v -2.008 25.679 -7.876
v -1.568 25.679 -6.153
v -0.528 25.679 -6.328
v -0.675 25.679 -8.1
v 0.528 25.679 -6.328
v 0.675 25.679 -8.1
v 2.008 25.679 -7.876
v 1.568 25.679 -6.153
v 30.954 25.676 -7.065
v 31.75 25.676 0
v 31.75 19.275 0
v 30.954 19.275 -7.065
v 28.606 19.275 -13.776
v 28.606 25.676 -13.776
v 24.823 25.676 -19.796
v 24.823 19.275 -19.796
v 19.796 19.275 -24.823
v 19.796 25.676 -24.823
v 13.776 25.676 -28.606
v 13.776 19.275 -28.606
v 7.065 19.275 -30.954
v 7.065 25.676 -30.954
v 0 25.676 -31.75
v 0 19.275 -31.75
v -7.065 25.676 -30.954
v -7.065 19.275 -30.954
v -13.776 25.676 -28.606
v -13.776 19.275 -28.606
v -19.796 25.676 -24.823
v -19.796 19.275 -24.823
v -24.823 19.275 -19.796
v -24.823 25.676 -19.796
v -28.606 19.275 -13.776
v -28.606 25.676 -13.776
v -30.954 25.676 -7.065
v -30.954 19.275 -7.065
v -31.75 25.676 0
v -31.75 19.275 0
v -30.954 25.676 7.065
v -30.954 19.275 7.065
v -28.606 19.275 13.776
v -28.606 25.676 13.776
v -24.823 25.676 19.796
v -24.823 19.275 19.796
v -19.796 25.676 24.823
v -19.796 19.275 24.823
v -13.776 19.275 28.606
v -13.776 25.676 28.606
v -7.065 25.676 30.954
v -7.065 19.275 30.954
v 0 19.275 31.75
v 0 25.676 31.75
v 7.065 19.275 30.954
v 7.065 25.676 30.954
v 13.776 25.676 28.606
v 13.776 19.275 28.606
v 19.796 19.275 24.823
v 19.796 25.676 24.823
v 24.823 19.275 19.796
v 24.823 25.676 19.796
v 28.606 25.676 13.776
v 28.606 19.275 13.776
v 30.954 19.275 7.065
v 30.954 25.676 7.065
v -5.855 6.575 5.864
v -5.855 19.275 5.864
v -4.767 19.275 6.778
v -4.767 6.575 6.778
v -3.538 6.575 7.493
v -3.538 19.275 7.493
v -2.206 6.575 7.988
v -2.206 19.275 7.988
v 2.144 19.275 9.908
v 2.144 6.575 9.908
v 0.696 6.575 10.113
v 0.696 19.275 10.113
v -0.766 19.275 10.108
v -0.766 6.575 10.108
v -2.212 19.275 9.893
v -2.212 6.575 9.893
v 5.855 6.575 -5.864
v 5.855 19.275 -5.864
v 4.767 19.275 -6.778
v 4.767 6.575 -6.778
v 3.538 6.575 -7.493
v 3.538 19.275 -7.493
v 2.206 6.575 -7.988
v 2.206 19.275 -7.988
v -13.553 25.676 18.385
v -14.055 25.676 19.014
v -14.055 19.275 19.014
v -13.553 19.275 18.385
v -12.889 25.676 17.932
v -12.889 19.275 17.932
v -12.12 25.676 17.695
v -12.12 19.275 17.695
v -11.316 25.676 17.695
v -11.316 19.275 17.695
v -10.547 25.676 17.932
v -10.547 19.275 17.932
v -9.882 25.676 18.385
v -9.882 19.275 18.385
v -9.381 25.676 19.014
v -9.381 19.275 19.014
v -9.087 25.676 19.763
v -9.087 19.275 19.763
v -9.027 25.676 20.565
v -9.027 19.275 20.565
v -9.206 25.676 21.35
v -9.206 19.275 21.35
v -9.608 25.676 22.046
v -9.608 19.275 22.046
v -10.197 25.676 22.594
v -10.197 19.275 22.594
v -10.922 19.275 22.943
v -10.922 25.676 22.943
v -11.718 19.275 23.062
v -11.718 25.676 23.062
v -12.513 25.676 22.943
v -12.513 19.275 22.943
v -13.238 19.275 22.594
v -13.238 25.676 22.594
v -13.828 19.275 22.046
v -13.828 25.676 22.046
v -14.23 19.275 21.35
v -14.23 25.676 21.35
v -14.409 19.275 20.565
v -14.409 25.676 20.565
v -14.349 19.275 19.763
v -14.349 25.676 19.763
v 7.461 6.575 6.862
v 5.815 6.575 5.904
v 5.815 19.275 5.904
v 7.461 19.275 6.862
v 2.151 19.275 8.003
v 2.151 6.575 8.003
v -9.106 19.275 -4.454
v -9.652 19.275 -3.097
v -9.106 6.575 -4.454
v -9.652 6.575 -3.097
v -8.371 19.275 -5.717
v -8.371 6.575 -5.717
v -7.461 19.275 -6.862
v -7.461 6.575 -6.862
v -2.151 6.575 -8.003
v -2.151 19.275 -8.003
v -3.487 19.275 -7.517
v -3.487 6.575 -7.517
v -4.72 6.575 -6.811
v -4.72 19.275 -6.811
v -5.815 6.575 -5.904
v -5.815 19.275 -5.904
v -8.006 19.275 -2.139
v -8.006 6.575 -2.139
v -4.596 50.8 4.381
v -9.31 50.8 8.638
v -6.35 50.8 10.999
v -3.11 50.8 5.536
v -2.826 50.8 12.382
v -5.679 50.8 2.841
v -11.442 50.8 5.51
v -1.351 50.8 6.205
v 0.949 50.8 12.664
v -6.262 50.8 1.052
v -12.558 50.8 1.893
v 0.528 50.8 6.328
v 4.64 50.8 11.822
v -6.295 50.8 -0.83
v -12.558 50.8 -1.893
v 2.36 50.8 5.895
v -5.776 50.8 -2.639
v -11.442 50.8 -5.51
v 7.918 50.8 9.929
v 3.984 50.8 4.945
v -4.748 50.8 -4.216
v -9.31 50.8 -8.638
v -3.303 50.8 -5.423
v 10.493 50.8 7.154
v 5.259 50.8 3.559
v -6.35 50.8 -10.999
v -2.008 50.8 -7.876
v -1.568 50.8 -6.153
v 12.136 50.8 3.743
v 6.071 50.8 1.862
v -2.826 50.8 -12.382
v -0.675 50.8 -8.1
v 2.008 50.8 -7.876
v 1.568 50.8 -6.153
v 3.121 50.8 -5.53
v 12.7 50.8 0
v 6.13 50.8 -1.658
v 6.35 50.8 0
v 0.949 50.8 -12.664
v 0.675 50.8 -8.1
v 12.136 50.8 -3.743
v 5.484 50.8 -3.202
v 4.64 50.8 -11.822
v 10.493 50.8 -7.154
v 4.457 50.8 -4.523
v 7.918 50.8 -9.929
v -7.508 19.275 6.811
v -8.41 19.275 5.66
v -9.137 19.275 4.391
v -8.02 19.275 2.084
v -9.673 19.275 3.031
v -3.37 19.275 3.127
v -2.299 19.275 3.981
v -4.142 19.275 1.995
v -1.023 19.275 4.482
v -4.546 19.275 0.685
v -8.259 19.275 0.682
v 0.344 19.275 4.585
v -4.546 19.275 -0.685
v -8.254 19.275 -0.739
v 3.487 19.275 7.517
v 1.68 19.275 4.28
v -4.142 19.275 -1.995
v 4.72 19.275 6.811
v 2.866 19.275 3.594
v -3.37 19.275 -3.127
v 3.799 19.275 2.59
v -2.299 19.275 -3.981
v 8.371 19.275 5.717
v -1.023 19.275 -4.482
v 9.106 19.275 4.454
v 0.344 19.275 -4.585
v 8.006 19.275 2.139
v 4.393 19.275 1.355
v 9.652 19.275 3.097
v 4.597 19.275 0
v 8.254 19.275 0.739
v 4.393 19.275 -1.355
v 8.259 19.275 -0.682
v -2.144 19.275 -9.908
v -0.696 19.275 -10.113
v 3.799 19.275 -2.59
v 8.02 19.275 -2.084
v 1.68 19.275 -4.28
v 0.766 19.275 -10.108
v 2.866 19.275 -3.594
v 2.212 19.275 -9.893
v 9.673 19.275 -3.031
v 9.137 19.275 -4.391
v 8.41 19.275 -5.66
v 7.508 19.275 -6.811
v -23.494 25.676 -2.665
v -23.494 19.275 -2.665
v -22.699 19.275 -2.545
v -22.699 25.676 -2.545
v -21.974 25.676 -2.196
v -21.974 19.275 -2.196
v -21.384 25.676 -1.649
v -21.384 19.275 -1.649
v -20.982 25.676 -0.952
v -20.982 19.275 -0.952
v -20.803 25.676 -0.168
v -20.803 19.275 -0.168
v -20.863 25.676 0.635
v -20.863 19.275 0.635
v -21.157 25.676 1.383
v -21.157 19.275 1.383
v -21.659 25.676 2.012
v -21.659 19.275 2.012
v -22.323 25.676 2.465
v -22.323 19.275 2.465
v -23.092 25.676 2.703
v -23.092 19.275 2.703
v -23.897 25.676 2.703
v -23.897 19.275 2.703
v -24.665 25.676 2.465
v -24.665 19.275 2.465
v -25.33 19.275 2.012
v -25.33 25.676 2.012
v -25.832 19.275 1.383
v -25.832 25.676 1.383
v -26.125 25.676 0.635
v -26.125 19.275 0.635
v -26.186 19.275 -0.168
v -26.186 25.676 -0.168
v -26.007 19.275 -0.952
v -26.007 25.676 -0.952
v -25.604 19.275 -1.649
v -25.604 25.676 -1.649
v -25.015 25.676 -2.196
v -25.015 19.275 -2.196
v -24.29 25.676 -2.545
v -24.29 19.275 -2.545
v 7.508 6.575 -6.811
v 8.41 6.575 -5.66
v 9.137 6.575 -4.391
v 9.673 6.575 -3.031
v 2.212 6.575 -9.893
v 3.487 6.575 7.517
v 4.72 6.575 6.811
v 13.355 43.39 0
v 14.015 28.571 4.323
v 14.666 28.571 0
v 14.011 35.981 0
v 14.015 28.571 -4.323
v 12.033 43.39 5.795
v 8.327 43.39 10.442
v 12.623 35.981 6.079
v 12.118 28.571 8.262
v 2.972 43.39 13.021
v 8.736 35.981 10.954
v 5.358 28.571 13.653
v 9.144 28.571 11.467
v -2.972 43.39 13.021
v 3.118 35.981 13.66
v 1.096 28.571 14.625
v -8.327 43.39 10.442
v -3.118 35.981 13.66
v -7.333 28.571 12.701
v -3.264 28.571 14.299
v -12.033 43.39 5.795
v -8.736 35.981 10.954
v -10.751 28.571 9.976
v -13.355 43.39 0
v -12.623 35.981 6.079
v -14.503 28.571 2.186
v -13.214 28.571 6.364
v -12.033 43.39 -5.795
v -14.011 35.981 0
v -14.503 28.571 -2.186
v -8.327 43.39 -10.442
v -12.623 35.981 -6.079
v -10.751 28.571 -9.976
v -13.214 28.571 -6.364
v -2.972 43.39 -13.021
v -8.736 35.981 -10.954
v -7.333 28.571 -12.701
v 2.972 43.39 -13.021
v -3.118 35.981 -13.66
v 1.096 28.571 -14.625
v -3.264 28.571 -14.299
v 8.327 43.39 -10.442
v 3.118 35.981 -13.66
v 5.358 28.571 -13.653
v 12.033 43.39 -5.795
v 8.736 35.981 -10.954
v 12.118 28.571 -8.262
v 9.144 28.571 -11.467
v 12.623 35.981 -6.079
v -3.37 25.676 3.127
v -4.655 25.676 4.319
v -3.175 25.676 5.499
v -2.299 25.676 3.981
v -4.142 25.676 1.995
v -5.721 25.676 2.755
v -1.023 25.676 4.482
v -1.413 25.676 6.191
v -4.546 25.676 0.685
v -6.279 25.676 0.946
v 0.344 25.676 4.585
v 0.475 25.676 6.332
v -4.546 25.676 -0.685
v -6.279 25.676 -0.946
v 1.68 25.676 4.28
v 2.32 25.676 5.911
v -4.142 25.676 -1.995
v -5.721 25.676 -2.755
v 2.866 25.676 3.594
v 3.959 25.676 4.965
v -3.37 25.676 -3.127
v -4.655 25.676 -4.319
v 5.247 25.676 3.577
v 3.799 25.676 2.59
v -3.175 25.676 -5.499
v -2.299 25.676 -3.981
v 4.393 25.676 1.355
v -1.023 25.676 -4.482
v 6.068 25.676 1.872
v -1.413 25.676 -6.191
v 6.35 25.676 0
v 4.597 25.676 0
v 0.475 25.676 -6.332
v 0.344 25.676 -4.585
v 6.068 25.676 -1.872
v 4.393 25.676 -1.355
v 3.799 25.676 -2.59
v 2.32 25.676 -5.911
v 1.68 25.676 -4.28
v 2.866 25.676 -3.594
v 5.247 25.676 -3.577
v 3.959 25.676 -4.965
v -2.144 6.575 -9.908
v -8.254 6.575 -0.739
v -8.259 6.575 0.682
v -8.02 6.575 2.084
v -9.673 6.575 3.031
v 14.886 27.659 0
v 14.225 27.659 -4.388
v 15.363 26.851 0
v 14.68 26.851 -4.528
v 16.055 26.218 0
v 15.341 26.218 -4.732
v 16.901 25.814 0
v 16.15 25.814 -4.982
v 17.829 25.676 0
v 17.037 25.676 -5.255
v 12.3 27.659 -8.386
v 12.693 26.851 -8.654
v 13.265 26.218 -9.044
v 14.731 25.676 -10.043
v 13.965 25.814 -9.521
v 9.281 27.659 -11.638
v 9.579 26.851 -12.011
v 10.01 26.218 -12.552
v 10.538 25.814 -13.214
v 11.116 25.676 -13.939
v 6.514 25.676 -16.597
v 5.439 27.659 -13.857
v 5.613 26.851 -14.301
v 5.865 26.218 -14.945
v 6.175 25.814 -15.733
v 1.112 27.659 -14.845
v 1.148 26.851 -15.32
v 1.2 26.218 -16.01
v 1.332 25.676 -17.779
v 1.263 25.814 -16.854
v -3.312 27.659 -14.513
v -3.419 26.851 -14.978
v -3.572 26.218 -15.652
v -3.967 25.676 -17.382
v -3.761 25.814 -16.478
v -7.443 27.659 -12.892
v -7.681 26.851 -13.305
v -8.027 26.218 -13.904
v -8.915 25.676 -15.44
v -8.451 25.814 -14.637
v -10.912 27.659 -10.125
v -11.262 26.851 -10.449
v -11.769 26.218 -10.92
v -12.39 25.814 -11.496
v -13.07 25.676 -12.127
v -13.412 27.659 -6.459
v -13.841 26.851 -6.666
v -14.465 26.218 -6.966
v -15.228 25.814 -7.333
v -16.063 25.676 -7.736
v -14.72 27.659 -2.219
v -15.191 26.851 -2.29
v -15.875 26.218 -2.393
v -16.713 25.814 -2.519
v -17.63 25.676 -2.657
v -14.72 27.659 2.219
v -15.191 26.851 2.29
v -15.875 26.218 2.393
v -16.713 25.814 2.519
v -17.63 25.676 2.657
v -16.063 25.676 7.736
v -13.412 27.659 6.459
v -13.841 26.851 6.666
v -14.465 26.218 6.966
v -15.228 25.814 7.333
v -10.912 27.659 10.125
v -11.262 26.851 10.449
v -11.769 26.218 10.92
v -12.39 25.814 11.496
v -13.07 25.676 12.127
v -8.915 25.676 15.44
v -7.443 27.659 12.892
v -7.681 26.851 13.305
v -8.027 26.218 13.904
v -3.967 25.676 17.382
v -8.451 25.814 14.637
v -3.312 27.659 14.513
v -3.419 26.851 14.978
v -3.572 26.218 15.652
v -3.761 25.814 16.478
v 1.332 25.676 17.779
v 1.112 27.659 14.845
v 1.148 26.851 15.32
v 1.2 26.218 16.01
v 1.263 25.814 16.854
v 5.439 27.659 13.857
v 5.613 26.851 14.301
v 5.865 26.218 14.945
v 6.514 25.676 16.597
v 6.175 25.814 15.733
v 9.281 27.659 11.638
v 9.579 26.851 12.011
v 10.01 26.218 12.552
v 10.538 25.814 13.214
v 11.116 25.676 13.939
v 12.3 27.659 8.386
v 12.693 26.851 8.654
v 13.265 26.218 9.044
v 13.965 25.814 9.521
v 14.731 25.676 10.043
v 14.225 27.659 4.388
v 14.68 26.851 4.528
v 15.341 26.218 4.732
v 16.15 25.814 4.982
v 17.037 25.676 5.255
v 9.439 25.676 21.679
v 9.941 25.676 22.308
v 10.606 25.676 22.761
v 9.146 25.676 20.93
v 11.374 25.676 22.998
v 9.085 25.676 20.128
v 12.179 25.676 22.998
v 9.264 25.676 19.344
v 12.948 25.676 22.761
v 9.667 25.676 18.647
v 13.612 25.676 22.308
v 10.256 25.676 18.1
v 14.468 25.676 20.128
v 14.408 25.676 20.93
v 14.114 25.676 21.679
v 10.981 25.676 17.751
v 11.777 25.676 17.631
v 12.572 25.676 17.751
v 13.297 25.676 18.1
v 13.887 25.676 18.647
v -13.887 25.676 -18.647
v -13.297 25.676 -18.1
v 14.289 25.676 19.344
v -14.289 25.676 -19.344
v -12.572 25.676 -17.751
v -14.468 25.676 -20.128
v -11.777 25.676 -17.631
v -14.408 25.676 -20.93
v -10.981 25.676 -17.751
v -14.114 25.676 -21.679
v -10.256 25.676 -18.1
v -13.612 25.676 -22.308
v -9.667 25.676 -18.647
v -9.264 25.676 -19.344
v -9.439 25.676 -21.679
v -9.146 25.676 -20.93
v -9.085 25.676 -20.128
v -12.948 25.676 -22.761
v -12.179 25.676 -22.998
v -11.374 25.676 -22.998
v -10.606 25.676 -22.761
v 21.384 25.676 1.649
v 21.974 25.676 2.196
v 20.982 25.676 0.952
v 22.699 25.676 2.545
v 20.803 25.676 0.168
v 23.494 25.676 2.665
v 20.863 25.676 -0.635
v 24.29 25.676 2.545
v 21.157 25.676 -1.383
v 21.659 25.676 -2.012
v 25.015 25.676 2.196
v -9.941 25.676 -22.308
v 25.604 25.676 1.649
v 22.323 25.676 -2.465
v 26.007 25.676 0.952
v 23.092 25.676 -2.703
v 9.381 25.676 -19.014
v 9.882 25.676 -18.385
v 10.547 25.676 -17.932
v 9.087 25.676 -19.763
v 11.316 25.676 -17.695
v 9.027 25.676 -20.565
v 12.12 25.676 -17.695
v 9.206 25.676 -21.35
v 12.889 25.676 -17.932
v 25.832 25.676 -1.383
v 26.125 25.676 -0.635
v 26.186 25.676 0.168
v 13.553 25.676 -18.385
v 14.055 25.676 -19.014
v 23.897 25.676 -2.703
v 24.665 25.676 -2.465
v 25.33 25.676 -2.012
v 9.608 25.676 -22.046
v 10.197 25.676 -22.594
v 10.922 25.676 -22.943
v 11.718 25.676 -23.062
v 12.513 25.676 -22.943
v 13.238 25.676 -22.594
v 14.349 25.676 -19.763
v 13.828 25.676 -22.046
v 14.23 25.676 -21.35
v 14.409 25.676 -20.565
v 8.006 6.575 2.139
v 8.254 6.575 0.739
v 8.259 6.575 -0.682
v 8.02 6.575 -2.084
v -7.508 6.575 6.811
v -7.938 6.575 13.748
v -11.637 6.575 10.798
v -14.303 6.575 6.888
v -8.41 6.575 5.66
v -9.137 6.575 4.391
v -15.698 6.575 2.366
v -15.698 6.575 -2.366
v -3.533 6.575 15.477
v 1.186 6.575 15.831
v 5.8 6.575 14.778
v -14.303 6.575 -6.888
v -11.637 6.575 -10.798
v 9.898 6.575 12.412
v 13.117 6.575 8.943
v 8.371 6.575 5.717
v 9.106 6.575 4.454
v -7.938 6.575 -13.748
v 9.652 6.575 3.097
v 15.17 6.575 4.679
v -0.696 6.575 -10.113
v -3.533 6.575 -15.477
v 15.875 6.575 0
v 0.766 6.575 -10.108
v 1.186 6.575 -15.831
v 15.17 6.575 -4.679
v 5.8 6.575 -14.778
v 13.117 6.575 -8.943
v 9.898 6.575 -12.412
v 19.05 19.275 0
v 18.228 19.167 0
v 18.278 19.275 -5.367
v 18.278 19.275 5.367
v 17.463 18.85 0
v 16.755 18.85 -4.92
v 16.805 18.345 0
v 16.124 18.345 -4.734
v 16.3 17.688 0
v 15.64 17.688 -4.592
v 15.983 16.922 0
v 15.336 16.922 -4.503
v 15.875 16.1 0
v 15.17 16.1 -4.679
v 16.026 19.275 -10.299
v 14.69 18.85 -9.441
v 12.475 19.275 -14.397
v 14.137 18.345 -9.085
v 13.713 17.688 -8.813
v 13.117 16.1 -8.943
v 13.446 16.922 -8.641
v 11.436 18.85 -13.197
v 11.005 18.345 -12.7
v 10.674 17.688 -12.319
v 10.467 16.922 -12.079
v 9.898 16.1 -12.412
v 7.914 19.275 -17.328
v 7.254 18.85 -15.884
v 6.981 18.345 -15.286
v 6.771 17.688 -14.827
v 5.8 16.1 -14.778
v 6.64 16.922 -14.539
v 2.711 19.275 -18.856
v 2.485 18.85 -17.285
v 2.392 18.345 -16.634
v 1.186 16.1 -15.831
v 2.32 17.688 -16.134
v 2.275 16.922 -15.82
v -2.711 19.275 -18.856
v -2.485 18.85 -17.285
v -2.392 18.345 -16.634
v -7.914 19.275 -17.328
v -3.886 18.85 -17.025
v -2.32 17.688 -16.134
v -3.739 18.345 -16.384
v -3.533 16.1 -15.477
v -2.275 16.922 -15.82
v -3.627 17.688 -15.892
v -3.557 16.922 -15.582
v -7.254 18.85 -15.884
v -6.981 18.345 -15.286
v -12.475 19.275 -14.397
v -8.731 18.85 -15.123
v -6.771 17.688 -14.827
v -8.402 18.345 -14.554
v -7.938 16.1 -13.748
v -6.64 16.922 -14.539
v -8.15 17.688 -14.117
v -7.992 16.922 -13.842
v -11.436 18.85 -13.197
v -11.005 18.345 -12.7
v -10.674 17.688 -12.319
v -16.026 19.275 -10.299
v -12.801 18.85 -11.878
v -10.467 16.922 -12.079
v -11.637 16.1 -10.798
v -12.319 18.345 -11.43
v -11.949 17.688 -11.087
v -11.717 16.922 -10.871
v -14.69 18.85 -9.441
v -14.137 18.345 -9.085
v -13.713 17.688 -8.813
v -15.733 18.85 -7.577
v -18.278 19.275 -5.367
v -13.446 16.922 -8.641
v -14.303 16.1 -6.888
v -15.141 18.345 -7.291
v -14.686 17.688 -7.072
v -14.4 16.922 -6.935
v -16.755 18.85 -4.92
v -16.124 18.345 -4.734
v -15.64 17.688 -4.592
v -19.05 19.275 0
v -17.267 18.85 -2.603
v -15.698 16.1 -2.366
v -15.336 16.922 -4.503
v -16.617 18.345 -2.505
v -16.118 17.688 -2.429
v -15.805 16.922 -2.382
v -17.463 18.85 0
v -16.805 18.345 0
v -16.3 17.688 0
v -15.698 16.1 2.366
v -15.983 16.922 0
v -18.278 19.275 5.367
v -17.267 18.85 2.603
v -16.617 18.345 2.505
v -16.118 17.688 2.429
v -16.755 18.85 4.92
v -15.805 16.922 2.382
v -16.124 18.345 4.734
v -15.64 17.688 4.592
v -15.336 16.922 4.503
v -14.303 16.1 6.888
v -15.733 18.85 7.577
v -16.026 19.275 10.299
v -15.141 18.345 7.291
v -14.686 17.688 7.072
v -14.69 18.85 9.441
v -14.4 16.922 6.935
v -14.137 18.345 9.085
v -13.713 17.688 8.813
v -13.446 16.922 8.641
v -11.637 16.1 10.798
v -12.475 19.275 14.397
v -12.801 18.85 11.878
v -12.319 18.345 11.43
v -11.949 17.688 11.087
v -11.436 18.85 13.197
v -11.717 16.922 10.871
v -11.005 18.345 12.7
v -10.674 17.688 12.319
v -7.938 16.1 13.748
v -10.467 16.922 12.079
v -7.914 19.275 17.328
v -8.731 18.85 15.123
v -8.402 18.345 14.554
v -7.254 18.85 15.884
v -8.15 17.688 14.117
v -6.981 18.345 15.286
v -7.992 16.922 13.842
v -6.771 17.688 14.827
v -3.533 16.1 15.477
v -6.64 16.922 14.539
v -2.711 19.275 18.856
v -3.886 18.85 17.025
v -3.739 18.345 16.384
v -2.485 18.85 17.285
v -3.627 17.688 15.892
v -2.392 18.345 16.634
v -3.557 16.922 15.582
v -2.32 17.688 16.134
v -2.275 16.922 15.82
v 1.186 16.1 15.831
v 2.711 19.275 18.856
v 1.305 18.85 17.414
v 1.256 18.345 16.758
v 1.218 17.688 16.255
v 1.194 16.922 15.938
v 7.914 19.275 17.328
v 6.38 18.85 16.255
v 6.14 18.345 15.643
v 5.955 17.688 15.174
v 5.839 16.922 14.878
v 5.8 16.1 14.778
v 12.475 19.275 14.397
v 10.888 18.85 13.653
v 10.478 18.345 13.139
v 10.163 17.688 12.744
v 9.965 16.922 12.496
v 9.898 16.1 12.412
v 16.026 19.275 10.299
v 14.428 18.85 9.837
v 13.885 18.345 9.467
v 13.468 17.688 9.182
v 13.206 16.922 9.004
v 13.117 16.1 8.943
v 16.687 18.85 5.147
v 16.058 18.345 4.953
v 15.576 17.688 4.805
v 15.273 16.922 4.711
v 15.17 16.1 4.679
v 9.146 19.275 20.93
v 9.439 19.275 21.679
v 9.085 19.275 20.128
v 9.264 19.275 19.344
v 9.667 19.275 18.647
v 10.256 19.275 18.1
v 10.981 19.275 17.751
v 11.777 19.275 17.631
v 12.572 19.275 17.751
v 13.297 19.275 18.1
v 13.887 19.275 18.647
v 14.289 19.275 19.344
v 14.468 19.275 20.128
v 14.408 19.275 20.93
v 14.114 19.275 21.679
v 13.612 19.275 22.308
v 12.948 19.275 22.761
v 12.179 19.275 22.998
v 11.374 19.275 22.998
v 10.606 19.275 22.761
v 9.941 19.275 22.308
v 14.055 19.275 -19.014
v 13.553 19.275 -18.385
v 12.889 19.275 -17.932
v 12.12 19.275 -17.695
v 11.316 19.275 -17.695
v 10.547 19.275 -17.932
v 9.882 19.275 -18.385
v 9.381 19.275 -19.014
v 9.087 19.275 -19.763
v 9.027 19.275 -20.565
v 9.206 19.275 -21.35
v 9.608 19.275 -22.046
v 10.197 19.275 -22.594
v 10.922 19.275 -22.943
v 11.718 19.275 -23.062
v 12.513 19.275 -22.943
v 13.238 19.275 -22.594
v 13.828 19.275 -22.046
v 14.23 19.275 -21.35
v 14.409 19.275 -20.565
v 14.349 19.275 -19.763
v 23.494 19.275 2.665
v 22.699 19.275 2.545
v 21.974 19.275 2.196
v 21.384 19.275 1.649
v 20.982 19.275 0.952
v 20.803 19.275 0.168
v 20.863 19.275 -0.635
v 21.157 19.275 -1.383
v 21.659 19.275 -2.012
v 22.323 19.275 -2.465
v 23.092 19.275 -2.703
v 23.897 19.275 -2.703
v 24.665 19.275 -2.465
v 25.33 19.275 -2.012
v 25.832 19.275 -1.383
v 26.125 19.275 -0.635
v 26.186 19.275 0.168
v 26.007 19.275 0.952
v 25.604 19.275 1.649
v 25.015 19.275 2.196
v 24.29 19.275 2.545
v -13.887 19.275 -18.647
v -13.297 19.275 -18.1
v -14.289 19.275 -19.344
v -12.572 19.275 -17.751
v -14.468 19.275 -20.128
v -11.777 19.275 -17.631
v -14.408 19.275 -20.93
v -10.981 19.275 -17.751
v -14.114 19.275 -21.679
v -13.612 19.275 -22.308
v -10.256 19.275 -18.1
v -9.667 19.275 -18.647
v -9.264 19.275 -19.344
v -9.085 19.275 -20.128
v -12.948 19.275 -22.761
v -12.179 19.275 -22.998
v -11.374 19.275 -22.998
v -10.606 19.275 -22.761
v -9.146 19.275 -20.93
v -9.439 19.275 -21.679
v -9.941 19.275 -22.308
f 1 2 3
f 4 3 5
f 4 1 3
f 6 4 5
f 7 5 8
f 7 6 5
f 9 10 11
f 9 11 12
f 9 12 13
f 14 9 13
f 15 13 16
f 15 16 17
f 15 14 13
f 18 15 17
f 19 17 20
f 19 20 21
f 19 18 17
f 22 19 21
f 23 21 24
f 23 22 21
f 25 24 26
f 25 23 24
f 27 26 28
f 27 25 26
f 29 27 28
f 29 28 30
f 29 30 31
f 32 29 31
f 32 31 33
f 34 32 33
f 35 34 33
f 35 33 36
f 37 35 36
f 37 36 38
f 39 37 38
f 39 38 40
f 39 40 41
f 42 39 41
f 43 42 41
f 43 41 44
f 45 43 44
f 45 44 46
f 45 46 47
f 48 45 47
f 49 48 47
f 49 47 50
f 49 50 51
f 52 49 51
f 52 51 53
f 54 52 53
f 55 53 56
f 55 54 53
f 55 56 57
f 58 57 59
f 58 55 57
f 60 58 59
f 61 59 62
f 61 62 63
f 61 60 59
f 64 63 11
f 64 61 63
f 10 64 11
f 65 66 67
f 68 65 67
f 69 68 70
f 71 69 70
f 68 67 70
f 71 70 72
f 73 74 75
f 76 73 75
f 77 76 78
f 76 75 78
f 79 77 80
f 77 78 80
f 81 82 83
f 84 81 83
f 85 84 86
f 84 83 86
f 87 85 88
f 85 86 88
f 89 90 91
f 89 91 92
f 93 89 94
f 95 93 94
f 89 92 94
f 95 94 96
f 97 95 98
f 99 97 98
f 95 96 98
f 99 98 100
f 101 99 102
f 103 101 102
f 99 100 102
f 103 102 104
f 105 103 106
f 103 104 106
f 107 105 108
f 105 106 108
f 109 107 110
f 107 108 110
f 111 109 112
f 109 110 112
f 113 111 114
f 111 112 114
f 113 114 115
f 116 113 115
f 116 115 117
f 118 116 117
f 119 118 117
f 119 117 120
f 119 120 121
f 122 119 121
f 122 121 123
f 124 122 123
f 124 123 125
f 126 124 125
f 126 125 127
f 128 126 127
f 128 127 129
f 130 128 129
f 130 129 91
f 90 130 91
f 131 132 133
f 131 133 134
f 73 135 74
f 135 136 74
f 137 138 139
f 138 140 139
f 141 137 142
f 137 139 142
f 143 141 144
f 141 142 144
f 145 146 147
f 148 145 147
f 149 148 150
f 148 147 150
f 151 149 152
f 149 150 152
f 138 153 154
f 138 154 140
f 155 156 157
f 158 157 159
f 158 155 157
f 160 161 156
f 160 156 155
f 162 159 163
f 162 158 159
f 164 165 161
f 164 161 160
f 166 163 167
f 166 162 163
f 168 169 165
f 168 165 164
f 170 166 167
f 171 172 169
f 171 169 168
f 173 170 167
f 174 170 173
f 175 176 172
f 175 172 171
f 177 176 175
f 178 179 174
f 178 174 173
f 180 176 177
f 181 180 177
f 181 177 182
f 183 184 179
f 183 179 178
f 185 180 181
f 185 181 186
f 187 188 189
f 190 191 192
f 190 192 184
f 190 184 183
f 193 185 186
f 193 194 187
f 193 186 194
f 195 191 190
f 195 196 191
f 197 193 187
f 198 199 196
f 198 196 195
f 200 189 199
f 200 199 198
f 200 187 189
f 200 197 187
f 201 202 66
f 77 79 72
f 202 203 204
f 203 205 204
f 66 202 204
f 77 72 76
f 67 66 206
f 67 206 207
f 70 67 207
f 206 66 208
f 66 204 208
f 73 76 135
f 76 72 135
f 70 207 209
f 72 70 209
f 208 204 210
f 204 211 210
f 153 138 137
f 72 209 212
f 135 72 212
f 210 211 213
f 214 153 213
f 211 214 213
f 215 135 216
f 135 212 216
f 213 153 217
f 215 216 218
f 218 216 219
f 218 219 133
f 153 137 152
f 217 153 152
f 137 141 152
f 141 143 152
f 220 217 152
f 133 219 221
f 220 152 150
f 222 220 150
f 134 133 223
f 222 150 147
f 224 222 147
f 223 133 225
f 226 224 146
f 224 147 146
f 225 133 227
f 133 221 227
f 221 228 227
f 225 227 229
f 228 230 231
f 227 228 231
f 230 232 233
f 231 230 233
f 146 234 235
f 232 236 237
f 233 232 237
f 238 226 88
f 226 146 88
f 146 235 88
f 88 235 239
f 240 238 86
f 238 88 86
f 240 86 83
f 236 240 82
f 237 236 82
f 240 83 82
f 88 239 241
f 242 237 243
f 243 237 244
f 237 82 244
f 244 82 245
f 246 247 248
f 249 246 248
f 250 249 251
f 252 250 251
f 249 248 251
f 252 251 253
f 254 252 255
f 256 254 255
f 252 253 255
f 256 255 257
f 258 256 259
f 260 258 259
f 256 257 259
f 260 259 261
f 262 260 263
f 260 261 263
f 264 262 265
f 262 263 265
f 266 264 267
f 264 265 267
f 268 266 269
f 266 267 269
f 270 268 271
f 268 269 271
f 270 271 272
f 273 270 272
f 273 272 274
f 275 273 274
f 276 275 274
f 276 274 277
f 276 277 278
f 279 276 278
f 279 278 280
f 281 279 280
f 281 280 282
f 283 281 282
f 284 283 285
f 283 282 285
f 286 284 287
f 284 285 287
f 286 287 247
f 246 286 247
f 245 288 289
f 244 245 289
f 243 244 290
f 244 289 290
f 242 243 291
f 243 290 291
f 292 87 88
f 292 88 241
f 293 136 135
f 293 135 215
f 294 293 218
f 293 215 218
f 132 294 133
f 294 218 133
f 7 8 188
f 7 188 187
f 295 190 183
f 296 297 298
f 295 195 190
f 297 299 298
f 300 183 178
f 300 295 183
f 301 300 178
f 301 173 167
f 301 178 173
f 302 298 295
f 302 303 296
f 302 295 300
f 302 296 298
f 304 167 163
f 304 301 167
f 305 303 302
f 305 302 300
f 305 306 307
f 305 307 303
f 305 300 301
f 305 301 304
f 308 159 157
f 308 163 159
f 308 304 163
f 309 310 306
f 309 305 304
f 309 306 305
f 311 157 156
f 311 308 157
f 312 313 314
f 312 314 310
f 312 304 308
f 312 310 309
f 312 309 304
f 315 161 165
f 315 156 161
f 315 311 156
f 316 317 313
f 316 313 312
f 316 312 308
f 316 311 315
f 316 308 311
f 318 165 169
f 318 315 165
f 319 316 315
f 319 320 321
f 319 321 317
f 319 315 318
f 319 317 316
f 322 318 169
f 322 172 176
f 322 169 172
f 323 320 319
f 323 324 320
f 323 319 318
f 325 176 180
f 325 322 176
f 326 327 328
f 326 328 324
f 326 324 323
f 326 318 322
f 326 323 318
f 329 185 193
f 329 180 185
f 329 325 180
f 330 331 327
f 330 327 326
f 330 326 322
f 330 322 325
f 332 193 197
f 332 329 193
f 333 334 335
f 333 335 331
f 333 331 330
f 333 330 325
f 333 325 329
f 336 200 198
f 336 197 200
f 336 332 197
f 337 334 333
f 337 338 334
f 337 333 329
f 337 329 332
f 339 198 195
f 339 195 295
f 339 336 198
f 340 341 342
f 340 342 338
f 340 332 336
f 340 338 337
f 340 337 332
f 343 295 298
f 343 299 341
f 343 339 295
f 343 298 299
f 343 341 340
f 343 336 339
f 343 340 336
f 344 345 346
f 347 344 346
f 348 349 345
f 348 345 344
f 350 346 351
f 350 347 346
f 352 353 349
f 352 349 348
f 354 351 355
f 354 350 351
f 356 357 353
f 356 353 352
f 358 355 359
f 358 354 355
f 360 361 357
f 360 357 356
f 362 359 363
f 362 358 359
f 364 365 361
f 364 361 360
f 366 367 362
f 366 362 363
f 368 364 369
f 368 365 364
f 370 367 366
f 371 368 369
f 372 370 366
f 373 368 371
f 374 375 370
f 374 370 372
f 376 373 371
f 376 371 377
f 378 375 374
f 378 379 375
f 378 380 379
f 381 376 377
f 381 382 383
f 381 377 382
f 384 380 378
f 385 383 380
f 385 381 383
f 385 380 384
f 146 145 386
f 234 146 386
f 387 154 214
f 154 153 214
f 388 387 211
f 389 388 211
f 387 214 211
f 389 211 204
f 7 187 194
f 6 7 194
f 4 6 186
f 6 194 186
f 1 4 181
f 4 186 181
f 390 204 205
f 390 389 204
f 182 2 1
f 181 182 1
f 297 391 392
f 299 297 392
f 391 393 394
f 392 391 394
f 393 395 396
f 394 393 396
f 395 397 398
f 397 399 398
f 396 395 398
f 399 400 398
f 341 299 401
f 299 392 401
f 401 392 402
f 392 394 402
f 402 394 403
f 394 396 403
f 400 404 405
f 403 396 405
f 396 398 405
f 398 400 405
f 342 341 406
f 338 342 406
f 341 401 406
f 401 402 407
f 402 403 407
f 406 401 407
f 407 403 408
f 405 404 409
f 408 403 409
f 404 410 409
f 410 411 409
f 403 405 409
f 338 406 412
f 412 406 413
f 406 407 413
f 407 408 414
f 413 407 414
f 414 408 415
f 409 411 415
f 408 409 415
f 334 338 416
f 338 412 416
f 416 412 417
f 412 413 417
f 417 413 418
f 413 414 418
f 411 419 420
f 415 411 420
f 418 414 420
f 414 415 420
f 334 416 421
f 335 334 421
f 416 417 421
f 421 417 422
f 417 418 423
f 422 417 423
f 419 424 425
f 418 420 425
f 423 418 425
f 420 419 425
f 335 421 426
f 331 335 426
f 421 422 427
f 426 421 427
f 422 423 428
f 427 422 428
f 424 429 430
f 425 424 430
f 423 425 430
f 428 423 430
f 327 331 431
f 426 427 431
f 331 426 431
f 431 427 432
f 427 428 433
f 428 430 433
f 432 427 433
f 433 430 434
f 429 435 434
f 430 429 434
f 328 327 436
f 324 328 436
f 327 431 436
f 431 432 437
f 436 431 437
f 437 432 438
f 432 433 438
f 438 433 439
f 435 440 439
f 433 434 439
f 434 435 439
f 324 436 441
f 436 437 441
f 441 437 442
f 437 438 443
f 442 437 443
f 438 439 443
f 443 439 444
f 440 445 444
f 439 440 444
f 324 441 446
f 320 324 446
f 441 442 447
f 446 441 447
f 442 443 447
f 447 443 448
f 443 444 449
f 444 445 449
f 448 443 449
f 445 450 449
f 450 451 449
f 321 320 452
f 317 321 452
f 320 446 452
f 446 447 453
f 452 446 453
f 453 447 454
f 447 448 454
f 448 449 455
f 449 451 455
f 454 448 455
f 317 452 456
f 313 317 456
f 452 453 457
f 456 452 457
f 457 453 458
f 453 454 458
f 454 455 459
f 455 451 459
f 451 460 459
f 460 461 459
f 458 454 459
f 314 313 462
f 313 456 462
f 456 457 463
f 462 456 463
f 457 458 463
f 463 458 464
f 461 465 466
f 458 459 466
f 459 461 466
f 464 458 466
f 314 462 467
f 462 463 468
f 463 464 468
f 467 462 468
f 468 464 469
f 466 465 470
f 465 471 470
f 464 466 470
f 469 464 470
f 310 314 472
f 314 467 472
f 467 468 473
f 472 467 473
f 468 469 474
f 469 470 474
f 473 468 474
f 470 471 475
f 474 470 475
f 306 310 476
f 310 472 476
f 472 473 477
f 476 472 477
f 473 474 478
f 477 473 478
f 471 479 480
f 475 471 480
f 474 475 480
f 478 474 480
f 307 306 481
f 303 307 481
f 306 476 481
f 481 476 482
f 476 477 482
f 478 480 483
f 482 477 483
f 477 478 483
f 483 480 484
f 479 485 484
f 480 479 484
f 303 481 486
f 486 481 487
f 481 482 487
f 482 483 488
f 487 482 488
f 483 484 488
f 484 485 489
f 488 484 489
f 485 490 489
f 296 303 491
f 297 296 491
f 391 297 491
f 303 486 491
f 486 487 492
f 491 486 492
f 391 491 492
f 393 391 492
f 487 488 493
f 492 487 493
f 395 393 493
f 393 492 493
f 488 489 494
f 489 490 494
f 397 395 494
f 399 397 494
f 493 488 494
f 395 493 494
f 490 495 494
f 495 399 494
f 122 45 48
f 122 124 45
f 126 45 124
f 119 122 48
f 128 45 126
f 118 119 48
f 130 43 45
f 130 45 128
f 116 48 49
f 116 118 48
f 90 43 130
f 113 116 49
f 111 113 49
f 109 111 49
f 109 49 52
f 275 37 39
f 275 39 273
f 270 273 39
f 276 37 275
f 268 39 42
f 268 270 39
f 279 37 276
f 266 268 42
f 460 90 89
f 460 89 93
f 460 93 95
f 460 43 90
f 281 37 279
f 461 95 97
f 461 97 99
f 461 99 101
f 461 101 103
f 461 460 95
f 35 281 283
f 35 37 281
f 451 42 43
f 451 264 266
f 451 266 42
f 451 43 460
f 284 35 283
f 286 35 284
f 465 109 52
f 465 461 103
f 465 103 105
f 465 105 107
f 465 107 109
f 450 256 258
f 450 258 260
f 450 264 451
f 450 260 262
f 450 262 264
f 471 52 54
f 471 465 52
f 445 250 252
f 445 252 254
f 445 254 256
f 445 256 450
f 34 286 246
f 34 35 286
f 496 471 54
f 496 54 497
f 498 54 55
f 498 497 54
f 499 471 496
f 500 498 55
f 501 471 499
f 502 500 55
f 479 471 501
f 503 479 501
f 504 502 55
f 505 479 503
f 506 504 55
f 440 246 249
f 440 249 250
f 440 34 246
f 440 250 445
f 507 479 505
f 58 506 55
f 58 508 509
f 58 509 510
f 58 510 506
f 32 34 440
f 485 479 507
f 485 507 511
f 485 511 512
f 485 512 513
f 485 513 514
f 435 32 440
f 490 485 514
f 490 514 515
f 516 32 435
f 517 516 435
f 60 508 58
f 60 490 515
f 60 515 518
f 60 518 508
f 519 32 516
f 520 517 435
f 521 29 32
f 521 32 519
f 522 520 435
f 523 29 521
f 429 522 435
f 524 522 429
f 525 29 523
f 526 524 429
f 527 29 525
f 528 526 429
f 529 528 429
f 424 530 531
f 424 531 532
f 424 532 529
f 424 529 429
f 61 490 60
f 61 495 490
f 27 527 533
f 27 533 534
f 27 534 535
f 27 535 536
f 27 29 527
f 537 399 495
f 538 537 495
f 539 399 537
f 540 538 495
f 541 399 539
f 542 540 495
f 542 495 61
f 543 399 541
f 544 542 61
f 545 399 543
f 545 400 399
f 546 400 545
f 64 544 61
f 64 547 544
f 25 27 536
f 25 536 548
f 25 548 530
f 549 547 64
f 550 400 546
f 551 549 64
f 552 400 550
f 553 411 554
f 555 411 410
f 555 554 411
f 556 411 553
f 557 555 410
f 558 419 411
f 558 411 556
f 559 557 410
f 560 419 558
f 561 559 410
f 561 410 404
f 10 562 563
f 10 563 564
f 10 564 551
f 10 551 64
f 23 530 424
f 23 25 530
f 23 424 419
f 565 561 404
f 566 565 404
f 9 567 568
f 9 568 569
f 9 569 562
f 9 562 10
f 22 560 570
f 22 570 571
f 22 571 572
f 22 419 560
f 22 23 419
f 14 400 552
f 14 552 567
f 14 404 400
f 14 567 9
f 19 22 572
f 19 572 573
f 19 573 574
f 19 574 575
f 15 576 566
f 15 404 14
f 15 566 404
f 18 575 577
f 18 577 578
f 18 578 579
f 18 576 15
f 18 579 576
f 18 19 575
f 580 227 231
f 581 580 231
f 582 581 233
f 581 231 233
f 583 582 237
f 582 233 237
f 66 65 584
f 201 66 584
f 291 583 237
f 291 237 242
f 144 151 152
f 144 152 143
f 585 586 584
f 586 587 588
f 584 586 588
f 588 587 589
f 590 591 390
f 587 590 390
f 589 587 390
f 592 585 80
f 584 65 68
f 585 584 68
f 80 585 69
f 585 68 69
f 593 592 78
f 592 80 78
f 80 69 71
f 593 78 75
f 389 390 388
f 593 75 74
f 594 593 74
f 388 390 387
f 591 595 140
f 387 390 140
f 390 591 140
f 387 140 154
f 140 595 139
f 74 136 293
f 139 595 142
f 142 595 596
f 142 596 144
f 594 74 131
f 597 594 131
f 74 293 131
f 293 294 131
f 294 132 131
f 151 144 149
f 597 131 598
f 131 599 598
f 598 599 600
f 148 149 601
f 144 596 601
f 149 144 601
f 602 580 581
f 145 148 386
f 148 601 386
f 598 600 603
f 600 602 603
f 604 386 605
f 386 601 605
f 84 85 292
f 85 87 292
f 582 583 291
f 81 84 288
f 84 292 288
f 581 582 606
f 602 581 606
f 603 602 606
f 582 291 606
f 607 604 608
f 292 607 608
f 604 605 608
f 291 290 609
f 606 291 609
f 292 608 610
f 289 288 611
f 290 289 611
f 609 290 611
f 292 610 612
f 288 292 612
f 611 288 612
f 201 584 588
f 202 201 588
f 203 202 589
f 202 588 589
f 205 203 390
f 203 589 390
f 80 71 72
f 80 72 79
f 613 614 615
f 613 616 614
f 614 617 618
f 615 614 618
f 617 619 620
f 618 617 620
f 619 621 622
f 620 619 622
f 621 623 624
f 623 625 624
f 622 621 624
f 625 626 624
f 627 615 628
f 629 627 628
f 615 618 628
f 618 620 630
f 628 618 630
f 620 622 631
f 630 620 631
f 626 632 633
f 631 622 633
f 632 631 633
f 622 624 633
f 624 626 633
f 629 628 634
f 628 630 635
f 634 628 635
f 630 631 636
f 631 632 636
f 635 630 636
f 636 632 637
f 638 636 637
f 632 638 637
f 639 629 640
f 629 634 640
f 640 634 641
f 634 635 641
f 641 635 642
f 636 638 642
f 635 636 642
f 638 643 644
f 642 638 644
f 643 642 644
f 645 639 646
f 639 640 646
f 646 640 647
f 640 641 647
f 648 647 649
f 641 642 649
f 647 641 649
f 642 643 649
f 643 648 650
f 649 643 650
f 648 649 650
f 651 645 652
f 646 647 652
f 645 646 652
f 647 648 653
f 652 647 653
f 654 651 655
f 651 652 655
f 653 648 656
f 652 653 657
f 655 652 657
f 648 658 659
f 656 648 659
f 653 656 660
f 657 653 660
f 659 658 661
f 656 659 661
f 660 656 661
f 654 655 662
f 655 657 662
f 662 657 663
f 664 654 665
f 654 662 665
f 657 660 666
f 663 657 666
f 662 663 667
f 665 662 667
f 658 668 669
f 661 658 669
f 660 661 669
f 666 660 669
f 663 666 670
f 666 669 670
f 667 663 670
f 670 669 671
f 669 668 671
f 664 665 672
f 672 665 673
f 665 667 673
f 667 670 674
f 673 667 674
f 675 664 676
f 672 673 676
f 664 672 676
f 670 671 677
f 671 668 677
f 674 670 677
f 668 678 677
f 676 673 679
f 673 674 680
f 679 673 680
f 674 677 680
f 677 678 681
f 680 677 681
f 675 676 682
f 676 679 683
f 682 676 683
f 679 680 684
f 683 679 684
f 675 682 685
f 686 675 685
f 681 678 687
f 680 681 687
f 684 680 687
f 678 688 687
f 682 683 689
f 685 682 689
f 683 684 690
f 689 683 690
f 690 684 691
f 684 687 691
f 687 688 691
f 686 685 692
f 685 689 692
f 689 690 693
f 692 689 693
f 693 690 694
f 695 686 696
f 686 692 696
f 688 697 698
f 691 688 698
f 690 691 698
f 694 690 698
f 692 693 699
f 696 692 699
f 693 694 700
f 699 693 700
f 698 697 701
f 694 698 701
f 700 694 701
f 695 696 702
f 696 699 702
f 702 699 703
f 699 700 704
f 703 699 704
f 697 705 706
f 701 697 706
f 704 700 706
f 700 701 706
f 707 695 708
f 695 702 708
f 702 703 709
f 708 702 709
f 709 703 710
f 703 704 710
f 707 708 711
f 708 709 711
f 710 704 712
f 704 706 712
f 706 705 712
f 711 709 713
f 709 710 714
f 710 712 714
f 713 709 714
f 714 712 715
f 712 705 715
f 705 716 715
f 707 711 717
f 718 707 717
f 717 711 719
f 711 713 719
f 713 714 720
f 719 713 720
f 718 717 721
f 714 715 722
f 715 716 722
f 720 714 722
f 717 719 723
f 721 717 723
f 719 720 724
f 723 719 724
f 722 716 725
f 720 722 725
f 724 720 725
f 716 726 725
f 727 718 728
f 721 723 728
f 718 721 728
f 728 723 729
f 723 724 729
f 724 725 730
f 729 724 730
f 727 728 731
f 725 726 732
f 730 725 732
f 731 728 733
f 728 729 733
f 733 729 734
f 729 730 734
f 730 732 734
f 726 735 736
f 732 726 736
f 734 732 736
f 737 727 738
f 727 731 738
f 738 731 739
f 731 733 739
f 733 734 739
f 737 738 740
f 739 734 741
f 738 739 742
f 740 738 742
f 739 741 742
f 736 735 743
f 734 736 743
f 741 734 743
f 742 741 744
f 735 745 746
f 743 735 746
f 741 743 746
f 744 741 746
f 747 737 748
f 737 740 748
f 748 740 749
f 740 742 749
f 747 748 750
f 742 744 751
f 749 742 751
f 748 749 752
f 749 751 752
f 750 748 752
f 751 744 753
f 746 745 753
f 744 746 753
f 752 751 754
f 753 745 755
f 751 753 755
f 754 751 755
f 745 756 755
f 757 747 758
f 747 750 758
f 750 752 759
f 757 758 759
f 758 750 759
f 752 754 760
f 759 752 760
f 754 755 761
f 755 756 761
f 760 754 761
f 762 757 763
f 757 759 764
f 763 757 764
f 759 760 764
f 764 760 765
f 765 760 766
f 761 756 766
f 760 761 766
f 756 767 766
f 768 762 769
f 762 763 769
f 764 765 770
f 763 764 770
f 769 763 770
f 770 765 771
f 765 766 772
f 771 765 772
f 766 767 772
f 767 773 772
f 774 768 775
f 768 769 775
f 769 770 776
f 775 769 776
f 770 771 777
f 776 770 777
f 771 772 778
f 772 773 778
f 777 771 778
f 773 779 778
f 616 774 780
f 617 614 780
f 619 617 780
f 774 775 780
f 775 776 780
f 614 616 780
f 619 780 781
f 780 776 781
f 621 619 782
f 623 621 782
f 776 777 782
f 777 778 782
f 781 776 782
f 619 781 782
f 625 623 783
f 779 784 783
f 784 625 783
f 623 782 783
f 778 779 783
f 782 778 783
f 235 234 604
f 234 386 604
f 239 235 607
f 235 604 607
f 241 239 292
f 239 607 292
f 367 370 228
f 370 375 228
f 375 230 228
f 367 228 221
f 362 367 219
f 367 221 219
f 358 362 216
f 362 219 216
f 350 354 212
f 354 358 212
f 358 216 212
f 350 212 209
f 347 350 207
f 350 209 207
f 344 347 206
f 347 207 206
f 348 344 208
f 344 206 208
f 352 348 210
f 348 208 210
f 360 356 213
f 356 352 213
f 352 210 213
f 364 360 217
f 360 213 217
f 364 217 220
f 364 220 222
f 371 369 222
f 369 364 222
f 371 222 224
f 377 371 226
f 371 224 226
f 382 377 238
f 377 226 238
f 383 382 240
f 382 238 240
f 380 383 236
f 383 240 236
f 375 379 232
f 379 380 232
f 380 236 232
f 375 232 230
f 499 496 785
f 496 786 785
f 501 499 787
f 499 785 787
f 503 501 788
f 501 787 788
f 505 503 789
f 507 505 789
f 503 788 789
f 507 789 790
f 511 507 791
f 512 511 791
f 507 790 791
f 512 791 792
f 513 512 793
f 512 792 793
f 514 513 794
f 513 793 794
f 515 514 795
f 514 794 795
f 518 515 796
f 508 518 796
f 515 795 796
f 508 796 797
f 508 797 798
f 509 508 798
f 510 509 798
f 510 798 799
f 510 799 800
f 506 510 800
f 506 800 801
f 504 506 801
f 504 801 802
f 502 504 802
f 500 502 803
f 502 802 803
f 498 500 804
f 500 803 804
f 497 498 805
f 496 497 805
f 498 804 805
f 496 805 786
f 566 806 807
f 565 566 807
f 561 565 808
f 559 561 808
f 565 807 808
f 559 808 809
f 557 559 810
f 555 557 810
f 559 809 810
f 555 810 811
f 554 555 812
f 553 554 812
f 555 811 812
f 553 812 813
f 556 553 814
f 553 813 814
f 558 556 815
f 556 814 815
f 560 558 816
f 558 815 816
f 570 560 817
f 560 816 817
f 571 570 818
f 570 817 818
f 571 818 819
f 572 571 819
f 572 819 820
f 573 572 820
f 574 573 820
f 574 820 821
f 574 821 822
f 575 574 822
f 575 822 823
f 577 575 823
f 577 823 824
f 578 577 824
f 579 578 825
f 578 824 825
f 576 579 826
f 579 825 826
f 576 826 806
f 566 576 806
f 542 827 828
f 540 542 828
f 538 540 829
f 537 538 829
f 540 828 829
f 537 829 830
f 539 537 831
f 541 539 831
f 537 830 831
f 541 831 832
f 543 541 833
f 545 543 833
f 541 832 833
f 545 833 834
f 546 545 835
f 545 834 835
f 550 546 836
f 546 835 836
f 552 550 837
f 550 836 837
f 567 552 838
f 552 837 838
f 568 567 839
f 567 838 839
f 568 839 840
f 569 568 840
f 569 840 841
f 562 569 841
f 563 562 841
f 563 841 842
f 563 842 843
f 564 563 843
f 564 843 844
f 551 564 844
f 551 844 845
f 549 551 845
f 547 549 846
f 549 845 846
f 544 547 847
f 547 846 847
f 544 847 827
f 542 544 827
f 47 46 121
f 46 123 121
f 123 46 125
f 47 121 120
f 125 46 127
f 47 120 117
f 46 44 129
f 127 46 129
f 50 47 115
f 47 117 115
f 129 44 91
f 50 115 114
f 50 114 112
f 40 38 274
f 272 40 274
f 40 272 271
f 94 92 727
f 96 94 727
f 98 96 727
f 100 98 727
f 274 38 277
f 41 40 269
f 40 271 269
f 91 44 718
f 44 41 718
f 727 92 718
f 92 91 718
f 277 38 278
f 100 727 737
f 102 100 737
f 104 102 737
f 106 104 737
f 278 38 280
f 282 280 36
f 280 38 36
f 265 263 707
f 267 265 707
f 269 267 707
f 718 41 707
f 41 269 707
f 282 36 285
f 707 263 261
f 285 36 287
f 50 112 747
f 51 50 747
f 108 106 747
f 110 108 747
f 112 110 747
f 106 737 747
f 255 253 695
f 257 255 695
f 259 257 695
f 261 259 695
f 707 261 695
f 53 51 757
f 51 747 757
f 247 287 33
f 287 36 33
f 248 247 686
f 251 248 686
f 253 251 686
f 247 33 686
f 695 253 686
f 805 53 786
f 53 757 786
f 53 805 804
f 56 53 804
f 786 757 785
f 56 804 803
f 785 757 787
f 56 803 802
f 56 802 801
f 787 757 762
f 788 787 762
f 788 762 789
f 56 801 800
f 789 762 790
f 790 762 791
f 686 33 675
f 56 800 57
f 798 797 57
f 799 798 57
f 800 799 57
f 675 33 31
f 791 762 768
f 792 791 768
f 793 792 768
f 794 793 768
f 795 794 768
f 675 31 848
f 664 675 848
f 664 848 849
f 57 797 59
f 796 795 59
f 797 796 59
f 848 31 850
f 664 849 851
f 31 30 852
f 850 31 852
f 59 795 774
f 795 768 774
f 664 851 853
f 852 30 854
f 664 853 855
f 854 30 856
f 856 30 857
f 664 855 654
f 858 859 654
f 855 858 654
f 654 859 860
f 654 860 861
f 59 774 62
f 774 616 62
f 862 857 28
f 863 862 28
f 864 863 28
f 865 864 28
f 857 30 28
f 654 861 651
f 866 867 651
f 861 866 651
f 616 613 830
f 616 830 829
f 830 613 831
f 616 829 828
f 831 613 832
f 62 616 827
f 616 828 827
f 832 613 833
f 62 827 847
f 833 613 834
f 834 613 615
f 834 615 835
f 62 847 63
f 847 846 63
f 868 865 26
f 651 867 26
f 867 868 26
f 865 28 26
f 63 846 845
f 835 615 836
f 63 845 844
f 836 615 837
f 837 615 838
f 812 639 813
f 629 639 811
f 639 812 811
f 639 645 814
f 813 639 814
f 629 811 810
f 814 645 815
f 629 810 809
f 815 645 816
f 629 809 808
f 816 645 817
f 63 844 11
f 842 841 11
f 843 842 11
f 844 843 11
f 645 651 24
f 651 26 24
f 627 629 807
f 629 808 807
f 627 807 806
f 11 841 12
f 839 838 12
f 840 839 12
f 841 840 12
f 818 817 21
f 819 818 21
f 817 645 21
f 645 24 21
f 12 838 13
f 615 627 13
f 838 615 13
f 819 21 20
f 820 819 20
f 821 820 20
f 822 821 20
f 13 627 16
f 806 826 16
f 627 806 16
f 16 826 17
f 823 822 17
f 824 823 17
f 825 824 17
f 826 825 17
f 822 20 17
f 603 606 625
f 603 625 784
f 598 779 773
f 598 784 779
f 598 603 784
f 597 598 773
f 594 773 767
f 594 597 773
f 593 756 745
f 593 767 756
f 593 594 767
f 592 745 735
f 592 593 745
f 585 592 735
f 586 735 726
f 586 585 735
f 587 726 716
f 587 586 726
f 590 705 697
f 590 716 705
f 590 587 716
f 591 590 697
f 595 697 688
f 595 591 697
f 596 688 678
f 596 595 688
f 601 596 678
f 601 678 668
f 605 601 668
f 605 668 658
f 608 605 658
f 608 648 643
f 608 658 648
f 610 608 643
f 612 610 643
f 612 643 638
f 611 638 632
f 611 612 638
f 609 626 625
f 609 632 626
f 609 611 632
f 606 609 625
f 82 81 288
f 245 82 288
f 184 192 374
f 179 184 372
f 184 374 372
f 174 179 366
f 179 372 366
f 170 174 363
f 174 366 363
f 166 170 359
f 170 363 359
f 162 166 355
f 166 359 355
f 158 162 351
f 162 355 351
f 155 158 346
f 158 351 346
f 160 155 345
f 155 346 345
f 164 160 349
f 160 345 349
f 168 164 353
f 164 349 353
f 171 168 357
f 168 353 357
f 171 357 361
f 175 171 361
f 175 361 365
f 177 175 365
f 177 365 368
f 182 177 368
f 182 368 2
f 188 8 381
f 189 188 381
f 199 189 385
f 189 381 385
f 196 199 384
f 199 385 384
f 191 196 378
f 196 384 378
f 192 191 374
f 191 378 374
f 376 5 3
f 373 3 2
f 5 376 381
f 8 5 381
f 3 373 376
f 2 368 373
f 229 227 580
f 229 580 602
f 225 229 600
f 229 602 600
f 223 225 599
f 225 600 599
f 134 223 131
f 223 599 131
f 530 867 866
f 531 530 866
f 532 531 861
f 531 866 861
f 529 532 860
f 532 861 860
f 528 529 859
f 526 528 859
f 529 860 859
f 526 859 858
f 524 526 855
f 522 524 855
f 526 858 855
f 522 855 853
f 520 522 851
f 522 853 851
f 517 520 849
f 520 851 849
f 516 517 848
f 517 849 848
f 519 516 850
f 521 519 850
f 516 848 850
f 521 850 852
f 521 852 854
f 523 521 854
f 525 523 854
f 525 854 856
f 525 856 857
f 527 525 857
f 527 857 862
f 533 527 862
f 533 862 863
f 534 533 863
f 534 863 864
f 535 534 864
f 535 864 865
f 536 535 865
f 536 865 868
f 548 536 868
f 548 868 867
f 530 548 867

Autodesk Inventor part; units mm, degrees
ref_plane "YZ Plane" through (0, 0, 0) normal (1, 0, 0) x (0, 1, 0)
ref_plane "XZ Plane" through (0, 0, 0) normal (0, 1, 0) x (-1, 0, 0)
ref_plane "XY Plane" through (0, 0, 0) normal (0, 0, 1) x (1, 0, 0)
sketch "Sketch1" plane through (0, 0, 0) normal (0, 0, 1) x (1, 0, 0)
  line L0 (0, 0) -> (0, 50.8) construction
  line L1 (0, 0) -> (50.8, 0) construction
  line L2 (0, 50.8) -> (6.35, 50.8) construction
  line L3 (6.35, 50.8) -> (6.35, 0) construction
  line L4 (6.35, 50.8) -> (12.7, 50.8)
  line L5 (0, 25.6759) -> (14.9225, 25.6759) construction
  line L6 (12.7, 50.8) -> (14.9225, 25.6759)
  line L7 (0, 19.2751) -> (31.75, 19.2751) construction
  line L8 (31.75, 19.2751) -> (31.75, 25.6759)
  line L9 (14.9225, 25.6759) -> (31.75, 25.6759)
  line L10 (0, 9.5479) -> (15.8115, 9.5479) construction
  line L11 (31.75, 19.2751) -> (15.875, 19.2751)
  line L12 (15.875, 19.2751) -> (15.875, 6.5751)
  line L13 (15.875, 19.2751) -> (28.575, 19.2751) construction
  line L14 (0, 22.4755) -> (31.75, 22.4755) construction
  line L15 (6.35, 50.8) -> (6.35, 25.6759)
  line L16 (0, 6.5751) -> (8.2867, 6.5751) construction
  line L17 (8.2867, 6.5751) -> (15.875, 6.5751)
  line L18 (8.2867, 6.5751) -> (8.2867, 19.2751)
  line L19 (23.5585, 11.9908) -> (23.5585, 41.3472) construction
  line L20 (4.5974, 71.0633) -> (4.5974, -11.3243) construction
  line L21 (8.2867, 19.2751) -> (4.5974, 19.2751)
  line L22 (4.5974, 25.6759) -> (6.35, 25.6759)
  line L23 (4.5974, 25.6759) -> (4.5974, 19.2751)
  dimension "d2" = 50.8
  dimension "d3" = 90
  dimension "d4" = 6.35
  dimension "d5" = 6.35
  dimension "d6" = 14.9225
  dimension "d8" = 25.2222
  dimension "d9" = 31.75
  dimension "d11" = 6.4008
  dimension "d12" = 15.8115
  dimension "d13" = 12.7
  dimension "d14" = 90
  dimension "d15" = 8.2867
  dimension "d28" = 8.1915
  dimension "d55" = 4.5974
  dimension "d56" = 12.7
  dimension "d57" = 25.1241
revolve "Revolution1" add sketch "Sketch1" angle 360 about axis through (0, 0, 0) along (0, 1, 0)
fillet "Fillet1" radius 3.175 1 edges at (-14.9225, 25.6759, 0)
fillet "Fillet2" radius 3.175 1 edges at (-15.875, 19.2751, 0)
hole "Hole2" at (23.4944, 25.6759, -0.034) direction (0, -1, 0) diameter 5.3975 end through all
pattern_circular "Circular Pattern1" count 6 over 360 about axis through (0, 38.238, 0) along (0, -1, 0) of "Hole2"
sketch "Sketch2" plane through (0, 6.5751, 0) normal (0, -1, 0) x (1, 0, 0)
  circle A0 centre (0, 0) radius 8.2867 construction
  line L0 (-2.2055, 7.9879) -> (-2.2121, 9.8928)
  circle A1 centre (0, 0) radius 10.1371 construction
  line L1 (2.1506, 8.0028) -> (2.144, 9.9078)
  line L2 (-2.2055, 7.9879) -> (2.1506, 8.0028) construction
  arc A2 (2.144, 9.9078) -> (-2.2121, 9.8928) centre (0, 0) ccw
  arc A3 (2.1506, 8.0028) -> (-2.2055, 7.9879) centre (0, 0) ccw
  dimension "d43" = 1.905
  dimension "d44" = 4.3561
extrude "Extrusion1" cut sketch "Sketch2" against normal blind 12.7
pattern_circular "Circular Pattern2" count 6 over 360 about axis through (0, 12.9251, 0) along (0, -1, 0) of "Extrusion1"
sketch "Sketch3" plane through (0, 50.8, 0) normal (0, 1, 0) x (1, 0, 0)
  circle A0 centre (0, 0) radius 6.35 construction
  line L0 (0, 6.35) -> (0, 8.128) construction
  circle A1 centre (0, 0) radius 8.128 construction
  line L1 (-1.5685, 6.1532) -> (-2.0076, 7.8762)
  line L2 (1.5685, 6.1532) -> (2.0076, 7.8762)
  line L3 (-1.5685, 6.1532) -> (1.5685, 6.1532) construction
  arc A2 (2.0076, 7.8762) -> (-2.0076, 7.8762) centre (0, 0) ccw
  arc A3 (1.5685, 6.1532) -> (-1.5685, 6.1532) centre (0, 0) ccw
  dimension "d51" = 1.778
  dimension "d52" = 3.1369
extrude "Extrusion2" cut sketch "Sketch3" against normal blind 25.1206
properties part number "denso-6 coupler"
